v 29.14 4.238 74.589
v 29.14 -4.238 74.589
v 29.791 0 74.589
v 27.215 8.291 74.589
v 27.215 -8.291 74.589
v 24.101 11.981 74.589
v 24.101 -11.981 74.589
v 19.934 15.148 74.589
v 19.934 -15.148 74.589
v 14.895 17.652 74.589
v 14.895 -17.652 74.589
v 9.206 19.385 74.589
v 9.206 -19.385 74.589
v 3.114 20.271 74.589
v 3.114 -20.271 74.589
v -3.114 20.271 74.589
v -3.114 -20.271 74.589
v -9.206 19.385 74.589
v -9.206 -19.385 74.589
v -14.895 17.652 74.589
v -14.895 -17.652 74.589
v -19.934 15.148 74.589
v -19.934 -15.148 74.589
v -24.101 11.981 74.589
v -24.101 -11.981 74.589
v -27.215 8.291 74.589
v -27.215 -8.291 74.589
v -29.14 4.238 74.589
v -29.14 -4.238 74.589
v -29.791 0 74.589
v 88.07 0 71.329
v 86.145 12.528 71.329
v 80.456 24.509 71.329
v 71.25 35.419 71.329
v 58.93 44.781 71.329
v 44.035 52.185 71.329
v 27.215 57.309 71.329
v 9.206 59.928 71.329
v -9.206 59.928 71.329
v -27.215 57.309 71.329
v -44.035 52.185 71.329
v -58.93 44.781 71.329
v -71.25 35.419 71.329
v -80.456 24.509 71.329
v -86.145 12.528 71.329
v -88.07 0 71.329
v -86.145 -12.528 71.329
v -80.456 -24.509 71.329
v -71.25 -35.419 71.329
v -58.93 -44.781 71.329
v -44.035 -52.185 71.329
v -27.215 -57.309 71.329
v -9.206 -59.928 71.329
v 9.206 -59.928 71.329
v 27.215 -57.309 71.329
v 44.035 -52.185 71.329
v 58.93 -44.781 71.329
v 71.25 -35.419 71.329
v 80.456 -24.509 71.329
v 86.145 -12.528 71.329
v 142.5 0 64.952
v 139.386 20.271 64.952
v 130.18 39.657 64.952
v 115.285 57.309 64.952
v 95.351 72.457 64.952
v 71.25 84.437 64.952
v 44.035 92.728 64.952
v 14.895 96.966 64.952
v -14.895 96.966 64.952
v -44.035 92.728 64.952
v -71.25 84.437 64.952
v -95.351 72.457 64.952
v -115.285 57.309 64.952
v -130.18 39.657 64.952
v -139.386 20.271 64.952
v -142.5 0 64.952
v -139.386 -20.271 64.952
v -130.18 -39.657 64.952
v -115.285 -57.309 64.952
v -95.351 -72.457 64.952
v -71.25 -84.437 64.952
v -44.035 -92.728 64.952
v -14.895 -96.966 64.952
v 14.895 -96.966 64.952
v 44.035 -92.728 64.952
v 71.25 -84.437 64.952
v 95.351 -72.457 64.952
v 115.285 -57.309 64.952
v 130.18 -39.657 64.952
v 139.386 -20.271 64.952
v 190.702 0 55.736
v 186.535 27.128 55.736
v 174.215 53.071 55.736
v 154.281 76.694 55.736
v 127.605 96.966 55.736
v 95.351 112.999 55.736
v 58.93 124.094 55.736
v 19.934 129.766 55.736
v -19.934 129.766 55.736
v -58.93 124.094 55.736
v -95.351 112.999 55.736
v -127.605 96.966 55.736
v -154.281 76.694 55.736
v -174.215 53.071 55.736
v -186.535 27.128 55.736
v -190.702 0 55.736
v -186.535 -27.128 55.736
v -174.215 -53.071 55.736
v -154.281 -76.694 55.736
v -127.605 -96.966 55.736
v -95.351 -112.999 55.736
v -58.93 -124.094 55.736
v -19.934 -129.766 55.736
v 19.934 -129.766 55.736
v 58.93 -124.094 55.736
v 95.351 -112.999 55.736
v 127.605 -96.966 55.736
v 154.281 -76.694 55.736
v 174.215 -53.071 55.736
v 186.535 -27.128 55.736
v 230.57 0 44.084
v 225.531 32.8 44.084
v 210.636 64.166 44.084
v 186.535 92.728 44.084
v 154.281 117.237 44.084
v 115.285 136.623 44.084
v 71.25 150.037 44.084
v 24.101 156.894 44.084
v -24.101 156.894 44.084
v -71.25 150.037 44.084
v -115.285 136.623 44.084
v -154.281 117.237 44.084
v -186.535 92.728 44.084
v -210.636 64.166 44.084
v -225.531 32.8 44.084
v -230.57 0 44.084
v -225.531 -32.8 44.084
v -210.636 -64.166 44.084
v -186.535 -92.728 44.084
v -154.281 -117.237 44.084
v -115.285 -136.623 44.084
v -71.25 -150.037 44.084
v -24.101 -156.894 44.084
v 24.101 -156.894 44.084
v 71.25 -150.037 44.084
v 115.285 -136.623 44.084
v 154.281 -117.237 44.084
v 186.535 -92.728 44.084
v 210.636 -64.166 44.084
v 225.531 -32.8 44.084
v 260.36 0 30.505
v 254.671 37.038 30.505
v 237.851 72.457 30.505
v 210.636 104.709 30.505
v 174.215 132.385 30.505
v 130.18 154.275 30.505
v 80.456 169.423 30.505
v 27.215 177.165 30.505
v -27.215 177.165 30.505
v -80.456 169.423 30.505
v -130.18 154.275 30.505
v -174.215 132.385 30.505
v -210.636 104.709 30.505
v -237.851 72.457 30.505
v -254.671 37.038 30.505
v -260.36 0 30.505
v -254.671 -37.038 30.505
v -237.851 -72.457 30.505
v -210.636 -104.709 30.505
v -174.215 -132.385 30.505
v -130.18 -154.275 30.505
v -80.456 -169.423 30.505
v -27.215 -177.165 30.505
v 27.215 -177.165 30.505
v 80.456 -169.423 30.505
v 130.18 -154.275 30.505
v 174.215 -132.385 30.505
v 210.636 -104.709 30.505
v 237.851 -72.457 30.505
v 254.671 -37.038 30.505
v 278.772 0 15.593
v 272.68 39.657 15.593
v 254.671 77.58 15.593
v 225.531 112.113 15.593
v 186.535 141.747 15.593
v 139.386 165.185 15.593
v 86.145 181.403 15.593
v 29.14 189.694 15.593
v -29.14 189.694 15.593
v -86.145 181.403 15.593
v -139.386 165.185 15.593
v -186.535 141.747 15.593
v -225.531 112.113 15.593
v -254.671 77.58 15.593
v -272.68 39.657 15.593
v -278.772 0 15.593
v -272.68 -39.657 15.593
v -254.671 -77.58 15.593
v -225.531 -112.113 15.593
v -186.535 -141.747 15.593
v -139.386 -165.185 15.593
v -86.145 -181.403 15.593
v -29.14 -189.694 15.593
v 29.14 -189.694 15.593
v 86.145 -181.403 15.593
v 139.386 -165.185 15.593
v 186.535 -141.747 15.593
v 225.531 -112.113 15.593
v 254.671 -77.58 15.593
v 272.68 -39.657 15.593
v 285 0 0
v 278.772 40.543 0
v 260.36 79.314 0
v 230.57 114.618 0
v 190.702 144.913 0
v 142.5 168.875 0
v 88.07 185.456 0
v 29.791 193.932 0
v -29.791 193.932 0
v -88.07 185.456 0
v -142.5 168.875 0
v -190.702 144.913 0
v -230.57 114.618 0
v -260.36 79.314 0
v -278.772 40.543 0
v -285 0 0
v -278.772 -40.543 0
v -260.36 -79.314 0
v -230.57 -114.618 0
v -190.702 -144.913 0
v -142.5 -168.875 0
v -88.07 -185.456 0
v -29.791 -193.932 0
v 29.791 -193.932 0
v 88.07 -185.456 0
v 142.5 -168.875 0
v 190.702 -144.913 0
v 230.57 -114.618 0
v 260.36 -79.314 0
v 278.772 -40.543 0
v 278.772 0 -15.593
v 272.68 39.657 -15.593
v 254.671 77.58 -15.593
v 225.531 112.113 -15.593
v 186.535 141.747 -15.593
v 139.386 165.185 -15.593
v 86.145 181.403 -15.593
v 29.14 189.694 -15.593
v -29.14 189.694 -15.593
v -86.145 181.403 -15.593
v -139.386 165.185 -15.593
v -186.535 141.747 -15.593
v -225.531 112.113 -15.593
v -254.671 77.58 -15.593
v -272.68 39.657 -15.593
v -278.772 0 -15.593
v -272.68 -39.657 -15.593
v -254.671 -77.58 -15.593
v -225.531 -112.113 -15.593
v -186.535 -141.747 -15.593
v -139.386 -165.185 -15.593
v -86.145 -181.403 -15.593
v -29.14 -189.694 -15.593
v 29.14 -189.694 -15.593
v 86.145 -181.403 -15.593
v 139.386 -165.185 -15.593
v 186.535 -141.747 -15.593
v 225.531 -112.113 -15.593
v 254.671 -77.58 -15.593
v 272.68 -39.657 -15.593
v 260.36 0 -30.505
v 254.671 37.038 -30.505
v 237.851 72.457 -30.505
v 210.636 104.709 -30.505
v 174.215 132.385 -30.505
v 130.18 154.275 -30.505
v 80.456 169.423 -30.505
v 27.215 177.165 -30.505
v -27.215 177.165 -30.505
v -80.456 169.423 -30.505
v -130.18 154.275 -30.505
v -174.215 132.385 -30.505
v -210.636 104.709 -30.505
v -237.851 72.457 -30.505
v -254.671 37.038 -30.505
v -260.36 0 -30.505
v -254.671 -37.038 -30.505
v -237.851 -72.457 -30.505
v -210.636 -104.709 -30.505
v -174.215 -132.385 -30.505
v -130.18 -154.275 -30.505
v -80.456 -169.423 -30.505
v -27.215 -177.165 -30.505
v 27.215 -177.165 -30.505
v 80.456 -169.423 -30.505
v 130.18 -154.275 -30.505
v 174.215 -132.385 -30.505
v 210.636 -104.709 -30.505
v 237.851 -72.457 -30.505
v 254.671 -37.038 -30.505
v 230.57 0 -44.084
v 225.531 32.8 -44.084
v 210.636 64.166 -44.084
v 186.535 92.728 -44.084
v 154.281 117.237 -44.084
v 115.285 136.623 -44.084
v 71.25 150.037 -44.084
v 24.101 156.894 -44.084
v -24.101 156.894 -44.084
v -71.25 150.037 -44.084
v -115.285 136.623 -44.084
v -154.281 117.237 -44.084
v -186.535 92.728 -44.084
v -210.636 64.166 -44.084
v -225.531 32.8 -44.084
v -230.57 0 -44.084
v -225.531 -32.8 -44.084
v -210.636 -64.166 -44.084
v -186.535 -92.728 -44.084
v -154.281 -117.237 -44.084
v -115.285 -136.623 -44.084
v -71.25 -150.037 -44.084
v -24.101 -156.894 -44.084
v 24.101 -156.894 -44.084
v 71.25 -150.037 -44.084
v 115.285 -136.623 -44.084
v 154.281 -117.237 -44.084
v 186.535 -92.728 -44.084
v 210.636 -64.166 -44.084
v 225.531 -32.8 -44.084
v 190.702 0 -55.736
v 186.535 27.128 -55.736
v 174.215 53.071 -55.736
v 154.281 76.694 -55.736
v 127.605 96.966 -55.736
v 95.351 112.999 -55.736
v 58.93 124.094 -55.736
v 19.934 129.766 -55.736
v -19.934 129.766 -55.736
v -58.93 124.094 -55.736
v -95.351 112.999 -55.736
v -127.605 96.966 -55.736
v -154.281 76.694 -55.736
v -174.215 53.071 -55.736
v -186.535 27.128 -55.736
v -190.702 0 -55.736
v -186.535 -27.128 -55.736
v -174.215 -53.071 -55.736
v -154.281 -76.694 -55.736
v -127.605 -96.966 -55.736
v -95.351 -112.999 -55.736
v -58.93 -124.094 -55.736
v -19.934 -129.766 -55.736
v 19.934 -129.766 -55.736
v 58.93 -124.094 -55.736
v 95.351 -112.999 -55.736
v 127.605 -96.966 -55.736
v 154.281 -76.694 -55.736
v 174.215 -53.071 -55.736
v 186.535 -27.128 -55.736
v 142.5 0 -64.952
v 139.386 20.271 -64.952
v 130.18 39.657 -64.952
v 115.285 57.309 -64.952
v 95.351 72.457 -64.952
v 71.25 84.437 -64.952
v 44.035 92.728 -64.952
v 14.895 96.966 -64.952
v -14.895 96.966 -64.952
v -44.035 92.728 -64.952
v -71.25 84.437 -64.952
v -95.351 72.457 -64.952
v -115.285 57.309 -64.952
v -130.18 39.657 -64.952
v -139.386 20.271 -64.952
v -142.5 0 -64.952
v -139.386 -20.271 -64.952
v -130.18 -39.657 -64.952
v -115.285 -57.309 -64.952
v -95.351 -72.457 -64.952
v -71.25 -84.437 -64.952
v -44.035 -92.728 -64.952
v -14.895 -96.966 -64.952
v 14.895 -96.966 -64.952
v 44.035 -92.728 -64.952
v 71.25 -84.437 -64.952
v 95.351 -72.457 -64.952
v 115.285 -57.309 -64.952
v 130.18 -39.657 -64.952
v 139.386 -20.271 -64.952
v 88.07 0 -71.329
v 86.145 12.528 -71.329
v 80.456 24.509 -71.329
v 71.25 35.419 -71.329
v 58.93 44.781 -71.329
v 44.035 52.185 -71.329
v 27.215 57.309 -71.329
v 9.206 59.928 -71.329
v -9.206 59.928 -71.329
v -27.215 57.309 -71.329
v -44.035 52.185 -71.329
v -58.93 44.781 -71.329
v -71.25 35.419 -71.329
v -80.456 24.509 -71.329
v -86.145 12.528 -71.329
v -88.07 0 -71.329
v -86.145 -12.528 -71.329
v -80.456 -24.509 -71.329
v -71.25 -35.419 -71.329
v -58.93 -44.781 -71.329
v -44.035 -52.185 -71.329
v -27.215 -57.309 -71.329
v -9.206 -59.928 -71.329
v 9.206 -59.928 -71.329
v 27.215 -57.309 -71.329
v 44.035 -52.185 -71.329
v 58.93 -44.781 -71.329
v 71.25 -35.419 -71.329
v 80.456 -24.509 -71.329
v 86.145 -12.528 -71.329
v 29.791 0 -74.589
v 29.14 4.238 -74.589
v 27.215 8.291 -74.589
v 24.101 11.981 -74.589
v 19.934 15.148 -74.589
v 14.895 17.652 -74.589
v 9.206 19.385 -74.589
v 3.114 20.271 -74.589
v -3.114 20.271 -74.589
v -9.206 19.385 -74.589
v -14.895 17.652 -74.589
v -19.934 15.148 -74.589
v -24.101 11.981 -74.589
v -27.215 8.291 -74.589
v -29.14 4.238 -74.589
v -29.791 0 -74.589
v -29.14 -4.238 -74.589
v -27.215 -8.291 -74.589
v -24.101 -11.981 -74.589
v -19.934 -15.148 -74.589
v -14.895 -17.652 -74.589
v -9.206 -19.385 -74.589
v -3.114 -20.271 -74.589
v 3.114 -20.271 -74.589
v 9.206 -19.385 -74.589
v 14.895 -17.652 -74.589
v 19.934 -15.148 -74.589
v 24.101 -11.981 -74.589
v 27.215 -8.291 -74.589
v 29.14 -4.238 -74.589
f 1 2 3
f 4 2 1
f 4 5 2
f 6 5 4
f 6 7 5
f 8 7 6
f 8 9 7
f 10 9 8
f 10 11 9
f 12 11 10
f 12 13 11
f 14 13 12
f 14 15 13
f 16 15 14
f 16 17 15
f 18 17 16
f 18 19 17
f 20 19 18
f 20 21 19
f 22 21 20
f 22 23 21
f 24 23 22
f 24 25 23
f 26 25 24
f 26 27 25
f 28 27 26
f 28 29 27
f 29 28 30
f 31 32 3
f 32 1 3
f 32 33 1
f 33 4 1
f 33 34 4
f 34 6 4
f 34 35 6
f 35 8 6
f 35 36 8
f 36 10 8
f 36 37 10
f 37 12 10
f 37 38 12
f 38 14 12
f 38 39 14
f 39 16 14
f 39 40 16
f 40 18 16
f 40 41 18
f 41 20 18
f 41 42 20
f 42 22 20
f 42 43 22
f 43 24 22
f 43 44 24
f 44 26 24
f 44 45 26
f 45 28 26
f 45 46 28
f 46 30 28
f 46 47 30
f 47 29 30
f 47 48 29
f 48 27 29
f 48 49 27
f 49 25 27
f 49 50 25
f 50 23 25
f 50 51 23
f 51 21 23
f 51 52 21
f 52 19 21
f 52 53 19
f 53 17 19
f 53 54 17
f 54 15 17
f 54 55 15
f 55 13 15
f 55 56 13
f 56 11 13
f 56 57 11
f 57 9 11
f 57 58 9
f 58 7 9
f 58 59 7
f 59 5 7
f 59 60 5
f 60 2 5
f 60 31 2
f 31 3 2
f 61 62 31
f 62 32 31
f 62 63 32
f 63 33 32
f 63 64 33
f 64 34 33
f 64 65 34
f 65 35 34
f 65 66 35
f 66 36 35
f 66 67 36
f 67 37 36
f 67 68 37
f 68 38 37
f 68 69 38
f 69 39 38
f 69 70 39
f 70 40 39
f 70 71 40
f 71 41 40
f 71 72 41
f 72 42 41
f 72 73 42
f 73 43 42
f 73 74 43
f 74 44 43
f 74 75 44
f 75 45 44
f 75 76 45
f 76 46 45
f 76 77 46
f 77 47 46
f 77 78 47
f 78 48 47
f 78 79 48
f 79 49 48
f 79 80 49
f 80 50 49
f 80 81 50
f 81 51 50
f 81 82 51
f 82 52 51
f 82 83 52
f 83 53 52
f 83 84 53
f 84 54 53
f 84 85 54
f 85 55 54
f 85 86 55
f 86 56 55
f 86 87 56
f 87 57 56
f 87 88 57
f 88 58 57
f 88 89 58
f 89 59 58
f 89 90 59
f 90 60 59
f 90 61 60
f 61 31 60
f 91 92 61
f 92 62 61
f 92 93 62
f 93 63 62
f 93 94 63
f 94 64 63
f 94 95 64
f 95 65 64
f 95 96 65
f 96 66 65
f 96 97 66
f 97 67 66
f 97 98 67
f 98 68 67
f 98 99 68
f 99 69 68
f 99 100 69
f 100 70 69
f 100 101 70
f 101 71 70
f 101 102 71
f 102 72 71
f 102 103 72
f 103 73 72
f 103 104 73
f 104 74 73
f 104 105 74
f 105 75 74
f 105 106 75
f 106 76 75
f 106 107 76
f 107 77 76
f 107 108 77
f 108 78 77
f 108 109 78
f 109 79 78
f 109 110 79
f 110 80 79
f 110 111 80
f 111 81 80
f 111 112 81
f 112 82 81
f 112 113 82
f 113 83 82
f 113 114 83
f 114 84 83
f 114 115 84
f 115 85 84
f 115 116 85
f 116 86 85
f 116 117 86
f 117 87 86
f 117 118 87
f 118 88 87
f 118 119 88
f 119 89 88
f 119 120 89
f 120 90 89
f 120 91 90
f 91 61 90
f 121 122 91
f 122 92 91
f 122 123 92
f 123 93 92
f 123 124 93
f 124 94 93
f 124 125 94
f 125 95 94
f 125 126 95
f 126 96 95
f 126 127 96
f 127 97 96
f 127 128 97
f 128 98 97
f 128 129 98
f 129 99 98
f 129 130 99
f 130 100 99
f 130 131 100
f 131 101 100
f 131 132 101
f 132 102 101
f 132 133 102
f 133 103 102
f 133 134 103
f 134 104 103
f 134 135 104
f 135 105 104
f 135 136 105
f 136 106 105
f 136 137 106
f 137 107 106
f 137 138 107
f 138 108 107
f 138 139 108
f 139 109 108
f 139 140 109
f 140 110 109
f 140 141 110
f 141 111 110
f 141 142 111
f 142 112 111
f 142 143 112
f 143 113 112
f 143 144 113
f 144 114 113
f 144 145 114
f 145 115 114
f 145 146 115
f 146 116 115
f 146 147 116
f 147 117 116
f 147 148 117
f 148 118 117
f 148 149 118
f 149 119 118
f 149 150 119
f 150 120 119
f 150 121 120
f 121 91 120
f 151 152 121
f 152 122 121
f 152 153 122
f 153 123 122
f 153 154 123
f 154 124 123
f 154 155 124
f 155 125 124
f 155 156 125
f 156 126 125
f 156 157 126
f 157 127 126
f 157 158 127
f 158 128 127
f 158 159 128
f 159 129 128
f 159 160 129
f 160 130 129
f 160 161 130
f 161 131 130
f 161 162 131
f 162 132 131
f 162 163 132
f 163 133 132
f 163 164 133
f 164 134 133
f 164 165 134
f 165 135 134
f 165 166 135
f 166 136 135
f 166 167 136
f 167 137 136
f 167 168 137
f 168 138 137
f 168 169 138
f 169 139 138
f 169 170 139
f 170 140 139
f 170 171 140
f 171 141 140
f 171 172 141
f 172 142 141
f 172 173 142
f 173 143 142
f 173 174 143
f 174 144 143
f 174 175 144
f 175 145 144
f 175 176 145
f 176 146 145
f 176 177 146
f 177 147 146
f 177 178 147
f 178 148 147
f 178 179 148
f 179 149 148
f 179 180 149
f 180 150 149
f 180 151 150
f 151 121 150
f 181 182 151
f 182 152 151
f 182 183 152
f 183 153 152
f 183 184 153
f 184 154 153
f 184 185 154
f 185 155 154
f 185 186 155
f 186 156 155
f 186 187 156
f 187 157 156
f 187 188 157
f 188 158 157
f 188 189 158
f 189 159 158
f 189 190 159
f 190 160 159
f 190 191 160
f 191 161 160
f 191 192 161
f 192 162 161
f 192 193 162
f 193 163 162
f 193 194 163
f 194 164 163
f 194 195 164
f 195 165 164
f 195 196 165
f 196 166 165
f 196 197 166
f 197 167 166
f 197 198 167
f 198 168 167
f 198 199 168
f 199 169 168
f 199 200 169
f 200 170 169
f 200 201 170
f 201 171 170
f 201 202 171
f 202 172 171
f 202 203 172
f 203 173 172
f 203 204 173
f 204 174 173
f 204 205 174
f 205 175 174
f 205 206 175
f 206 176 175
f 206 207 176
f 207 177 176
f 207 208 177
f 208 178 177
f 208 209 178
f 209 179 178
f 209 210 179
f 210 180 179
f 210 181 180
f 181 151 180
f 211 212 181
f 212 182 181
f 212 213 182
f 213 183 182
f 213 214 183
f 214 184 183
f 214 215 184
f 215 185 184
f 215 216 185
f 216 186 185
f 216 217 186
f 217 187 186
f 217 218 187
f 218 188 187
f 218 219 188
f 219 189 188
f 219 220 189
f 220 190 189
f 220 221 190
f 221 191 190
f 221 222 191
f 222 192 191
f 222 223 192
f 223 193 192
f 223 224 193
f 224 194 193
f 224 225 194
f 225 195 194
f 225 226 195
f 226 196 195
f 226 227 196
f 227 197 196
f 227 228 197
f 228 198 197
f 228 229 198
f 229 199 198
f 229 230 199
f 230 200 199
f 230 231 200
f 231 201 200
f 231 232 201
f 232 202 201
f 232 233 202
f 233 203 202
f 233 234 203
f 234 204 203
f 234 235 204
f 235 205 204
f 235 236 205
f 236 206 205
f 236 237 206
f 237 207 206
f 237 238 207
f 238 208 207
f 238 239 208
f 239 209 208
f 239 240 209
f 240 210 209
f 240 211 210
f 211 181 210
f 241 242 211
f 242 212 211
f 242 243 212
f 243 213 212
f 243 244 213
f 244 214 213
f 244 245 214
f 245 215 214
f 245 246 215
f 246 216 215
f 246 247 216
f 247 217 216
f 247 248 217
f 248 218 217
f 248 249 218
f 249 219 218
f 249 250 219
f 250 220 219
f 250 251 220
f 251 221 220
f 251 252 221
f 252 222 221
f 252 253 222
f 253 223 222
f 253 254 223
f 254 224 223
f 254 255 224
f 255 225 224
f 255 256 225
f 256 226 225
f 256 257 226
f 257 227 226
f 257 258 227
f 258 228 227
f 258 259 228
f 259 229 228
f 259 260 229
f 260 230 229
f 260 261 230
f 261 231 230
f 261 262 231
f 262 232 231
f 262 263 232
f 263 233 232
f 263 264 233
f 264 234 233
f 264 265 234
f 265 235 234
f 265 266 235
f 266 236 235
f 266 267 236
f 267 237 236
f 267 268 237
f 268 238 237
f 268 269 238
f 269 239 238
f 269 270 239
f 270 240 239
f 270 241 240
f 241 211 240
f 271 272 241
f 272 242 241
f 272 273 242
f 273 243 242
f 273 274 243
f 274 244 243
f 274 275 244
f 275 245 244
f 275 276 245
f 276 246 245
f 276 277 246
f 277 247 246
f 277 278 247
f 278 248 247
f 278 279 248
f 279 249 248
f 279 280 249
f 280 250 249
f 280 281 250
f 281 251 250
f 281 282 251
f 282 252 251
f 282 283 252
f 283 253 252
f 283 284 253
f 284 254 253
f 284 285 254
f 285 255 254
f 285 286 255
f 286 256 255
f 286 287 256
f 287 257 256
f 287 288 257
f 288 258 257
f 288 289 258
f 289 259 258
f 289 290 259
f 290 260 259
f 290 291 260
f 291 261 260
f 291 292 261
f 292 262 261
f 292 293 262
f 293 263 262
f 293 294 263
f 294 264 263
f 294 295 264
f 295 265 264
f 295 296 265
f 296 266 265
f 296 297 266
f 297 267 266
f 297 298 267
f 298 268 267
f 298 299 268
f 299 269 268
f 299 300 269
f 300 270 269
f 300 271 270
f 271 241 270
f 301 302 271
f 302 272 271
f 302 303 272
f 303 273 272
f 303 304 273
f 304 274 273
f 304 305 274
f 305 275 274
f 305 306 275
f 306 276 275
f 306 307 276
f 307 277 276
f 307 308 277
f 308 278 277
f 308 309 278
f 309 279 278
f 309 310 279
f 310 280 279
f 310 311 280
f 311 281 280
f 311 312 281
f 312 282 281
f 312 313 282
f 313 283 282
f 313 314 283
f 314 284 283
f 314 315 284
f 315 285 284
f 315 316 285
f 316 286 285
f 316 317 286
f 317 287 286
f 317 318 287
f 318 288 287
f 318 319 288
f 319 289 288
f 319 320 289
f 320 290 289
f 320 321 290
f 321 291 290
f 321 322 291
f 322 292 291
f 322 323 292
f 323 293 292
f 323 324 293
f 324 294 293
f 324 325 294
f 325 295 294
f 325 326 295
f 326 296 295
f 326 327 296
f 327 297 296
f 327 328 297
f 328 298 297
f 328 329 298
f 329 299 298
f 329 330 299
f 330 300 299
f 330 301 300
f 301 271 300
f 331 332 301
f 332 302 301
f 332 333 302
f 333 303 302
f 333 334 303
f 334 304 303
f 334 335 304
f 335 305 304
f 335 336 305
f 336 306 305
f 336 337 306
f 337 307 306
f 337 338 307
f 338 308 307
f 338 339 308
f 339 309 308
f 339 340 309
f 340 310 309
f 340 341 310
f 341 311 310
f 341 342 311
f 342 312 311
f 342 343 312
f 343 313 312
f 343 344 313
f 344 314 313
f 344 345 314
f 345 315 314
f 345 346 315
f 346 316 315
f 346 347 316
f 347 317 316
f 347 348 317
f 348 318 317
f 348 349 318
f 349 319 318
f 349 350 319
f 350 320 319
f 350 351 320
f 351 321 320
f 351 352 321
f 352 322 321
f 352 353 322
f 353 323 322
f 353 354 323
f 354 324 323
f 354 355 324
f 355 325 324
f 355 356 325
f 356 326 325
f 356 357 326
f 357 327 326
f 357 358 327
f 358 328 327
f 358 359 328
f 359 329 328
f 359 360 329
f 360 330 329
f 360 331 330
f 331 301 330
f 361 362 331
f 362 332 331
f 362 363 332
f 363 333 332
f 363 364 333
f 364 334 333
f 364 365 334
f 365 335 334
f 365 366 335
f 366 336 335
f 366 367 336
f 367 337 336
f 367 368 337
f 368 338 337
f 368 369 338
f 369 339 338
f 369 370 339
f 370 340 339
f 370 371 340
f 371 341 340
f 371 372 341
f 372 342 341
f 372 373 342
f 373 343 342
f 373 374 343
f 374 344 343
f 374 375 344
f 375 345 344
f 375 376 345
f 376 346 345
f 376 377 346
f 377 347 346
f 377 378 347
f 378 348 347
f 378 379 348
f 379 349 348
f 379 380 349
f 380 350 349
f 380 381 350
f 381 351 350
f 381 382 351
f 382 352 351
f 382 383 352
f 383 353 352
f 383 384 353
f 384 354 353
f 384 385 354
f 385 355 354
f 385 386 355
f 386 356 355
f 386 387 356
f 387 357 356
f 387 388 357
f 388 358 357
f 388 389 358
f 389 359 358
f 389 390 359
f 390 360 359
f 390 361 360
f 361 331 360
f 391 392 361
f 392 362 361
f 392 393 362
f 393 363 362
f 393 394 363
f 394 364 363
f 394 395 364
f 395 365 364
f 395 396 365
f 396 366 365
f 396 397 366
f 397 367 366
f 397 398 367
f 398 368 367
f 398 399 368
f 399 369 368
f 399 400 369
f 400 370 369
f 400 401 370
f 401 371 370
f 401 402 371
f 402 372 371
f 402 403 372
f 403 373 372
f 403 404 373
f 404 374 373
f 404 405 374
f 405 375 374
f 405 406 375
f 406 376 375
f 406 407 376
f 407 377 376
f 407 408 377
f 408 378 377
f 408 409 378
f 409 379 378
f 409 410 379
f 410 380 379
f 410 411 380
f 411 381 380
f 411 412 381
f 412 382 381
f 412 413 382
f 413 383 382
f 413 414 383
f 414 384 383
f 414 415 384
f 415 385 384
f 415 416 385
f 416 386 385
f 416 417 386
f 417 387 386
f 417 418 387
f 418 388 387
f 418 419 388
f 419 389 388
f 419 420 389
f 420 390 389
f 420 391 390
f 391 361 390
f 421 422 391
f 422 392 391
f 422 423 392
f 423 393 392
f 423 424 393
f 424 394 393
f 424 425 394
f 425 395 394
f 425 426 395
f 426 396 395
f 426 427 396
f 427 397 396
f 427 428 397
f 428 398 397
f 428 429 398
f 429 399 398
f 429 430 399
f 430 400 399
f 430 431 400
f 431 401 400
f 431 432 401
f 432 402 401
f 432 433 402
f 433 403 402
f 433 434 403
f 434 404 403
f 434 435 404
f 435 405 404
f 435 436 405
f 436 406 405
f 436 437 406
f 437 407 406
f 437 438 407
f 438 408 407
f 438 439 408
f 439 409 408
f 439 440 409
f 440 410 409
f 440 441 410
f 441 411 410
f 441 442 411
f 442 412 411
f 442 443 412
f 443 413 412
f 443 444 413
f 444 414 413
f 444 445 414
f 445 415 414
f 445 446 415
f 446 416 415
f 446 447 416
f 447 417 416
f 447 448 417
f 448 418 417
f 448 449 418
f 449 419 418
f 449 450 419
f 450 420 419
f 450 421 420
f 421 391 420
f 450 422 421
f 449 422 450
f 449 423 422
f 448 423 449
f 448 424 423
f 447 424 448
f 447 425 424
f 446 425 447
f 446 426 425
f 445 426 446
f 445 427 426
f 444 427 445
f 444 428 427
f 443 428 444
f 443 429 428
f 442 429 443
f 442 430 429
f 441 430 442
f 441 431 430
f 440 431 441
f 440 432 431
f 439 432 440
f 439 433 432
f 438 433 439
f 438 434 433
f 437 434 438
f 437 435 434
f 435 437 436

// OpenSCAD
// Generated by SolidPython 1.0.1 on 2020-07-29 00:46:54


scale(v = [19, 13, 5]) {
	sphere(r = 15);
}
/***********************************************
*********      SolidPython code:      **********
************************************************
 
# import packages: SolidPython
from solid import *
from solid.utils import *
from itertools import chain, combinations, permutations


class Resize:

    def __init__(self, scad_file):
        self.scad_file = scad_file
        #self.scad_file = import_scad(scad_file)
        # cone/cylinder param:
        self.r1 = 0
        self.r2 = 0
        self.h = 0
        # rectangular prism param:
        self.w = 0
        self.l = 0
        # ellipse param:
        self.r = 0

    # import OpenScad code (file name corresponds to shape)


    # classify shape + parameters
    def assign(self, param1, param2, param3):
        if self.scad_file == 'cone.scad':
            self.r1 = param1
            self.r2 = param2
            self.h = param3
        elif self.scad_file == 'cylinder.scad':
            self.r1 = param1
            self.r2 = param2
            self.h = param3
        elif self.scad_file == 'rectangularPrism.scad':
            self.h = param1
            self.l = param2
            self.w = param3
        else:
            self.r = param1
            self.h = param2

    # resize parameters
    def iterate(self):
        x = range(3, 20, 2)
        i = 1
        if self.scad_file == 'cone.scad':
            tempList = list(permutations(x, 2))
            for temp in tempList:
                param1 = temp[0]
                param2 = temp[1]
                filepath = 'produced_scad_files/' + 'cone' + str(param1) + '_' + str(param2) + '_' + '.scad'
                scad_render_to_file(cylinder(h=param1, r1=param2, r2=0), filepath)

        elif self.scad_file == 'cylinder.scad':
            tempList = list(permutations(x, 3))
            for temp in tempList:
                param1 = temp[0]
                param2 = temp[1]
                filepath = 'produced_scad_files/' + 'cylinder' + str(param1) + '_' + str(param2) + '_' + '.scad'
                scad_render_to_file(cylinder(h=param1, r1=param2, r2=param2), filepath)

        elif self.scad_file == 'rectangularPrism.scad':
            tempList = list(permutations(x, 3))
            for temp in tempList:
                param1 = temp[0]
                param2 = temp[1]
                param3 = temp[2]
                filepath = 'produced_scad_files/' + 'rectangularPrism' + str(param1) + '_' + str(param2) + '_' + str(
                    param3) + '.scad'
                scad_render_to_file(cube(size=(param1, param2, param3)), filepath)

        elif self.scad_file == 'ellipse.scad':
            tempList = list(permutations(x, 4))
            for temp in tempList:
                param1 = temp[0]
                param2 = temp[1]
                param3 = temp[2]
                param4 = temp[3]
                filepath = 'produced_scad_files/' + 'ellipse' + str(param1) + '_' + str(param2) + '_' + str(param3) + '_' + str(param4) + '.scad'
                scad_render_to_file(scale([param1, param2, param3])(sphere(r=param4)), filepath)

    def render_to_scadfile(self):
        scad_render_to_file(scad, 'example.scad') 
 
************************************************/
